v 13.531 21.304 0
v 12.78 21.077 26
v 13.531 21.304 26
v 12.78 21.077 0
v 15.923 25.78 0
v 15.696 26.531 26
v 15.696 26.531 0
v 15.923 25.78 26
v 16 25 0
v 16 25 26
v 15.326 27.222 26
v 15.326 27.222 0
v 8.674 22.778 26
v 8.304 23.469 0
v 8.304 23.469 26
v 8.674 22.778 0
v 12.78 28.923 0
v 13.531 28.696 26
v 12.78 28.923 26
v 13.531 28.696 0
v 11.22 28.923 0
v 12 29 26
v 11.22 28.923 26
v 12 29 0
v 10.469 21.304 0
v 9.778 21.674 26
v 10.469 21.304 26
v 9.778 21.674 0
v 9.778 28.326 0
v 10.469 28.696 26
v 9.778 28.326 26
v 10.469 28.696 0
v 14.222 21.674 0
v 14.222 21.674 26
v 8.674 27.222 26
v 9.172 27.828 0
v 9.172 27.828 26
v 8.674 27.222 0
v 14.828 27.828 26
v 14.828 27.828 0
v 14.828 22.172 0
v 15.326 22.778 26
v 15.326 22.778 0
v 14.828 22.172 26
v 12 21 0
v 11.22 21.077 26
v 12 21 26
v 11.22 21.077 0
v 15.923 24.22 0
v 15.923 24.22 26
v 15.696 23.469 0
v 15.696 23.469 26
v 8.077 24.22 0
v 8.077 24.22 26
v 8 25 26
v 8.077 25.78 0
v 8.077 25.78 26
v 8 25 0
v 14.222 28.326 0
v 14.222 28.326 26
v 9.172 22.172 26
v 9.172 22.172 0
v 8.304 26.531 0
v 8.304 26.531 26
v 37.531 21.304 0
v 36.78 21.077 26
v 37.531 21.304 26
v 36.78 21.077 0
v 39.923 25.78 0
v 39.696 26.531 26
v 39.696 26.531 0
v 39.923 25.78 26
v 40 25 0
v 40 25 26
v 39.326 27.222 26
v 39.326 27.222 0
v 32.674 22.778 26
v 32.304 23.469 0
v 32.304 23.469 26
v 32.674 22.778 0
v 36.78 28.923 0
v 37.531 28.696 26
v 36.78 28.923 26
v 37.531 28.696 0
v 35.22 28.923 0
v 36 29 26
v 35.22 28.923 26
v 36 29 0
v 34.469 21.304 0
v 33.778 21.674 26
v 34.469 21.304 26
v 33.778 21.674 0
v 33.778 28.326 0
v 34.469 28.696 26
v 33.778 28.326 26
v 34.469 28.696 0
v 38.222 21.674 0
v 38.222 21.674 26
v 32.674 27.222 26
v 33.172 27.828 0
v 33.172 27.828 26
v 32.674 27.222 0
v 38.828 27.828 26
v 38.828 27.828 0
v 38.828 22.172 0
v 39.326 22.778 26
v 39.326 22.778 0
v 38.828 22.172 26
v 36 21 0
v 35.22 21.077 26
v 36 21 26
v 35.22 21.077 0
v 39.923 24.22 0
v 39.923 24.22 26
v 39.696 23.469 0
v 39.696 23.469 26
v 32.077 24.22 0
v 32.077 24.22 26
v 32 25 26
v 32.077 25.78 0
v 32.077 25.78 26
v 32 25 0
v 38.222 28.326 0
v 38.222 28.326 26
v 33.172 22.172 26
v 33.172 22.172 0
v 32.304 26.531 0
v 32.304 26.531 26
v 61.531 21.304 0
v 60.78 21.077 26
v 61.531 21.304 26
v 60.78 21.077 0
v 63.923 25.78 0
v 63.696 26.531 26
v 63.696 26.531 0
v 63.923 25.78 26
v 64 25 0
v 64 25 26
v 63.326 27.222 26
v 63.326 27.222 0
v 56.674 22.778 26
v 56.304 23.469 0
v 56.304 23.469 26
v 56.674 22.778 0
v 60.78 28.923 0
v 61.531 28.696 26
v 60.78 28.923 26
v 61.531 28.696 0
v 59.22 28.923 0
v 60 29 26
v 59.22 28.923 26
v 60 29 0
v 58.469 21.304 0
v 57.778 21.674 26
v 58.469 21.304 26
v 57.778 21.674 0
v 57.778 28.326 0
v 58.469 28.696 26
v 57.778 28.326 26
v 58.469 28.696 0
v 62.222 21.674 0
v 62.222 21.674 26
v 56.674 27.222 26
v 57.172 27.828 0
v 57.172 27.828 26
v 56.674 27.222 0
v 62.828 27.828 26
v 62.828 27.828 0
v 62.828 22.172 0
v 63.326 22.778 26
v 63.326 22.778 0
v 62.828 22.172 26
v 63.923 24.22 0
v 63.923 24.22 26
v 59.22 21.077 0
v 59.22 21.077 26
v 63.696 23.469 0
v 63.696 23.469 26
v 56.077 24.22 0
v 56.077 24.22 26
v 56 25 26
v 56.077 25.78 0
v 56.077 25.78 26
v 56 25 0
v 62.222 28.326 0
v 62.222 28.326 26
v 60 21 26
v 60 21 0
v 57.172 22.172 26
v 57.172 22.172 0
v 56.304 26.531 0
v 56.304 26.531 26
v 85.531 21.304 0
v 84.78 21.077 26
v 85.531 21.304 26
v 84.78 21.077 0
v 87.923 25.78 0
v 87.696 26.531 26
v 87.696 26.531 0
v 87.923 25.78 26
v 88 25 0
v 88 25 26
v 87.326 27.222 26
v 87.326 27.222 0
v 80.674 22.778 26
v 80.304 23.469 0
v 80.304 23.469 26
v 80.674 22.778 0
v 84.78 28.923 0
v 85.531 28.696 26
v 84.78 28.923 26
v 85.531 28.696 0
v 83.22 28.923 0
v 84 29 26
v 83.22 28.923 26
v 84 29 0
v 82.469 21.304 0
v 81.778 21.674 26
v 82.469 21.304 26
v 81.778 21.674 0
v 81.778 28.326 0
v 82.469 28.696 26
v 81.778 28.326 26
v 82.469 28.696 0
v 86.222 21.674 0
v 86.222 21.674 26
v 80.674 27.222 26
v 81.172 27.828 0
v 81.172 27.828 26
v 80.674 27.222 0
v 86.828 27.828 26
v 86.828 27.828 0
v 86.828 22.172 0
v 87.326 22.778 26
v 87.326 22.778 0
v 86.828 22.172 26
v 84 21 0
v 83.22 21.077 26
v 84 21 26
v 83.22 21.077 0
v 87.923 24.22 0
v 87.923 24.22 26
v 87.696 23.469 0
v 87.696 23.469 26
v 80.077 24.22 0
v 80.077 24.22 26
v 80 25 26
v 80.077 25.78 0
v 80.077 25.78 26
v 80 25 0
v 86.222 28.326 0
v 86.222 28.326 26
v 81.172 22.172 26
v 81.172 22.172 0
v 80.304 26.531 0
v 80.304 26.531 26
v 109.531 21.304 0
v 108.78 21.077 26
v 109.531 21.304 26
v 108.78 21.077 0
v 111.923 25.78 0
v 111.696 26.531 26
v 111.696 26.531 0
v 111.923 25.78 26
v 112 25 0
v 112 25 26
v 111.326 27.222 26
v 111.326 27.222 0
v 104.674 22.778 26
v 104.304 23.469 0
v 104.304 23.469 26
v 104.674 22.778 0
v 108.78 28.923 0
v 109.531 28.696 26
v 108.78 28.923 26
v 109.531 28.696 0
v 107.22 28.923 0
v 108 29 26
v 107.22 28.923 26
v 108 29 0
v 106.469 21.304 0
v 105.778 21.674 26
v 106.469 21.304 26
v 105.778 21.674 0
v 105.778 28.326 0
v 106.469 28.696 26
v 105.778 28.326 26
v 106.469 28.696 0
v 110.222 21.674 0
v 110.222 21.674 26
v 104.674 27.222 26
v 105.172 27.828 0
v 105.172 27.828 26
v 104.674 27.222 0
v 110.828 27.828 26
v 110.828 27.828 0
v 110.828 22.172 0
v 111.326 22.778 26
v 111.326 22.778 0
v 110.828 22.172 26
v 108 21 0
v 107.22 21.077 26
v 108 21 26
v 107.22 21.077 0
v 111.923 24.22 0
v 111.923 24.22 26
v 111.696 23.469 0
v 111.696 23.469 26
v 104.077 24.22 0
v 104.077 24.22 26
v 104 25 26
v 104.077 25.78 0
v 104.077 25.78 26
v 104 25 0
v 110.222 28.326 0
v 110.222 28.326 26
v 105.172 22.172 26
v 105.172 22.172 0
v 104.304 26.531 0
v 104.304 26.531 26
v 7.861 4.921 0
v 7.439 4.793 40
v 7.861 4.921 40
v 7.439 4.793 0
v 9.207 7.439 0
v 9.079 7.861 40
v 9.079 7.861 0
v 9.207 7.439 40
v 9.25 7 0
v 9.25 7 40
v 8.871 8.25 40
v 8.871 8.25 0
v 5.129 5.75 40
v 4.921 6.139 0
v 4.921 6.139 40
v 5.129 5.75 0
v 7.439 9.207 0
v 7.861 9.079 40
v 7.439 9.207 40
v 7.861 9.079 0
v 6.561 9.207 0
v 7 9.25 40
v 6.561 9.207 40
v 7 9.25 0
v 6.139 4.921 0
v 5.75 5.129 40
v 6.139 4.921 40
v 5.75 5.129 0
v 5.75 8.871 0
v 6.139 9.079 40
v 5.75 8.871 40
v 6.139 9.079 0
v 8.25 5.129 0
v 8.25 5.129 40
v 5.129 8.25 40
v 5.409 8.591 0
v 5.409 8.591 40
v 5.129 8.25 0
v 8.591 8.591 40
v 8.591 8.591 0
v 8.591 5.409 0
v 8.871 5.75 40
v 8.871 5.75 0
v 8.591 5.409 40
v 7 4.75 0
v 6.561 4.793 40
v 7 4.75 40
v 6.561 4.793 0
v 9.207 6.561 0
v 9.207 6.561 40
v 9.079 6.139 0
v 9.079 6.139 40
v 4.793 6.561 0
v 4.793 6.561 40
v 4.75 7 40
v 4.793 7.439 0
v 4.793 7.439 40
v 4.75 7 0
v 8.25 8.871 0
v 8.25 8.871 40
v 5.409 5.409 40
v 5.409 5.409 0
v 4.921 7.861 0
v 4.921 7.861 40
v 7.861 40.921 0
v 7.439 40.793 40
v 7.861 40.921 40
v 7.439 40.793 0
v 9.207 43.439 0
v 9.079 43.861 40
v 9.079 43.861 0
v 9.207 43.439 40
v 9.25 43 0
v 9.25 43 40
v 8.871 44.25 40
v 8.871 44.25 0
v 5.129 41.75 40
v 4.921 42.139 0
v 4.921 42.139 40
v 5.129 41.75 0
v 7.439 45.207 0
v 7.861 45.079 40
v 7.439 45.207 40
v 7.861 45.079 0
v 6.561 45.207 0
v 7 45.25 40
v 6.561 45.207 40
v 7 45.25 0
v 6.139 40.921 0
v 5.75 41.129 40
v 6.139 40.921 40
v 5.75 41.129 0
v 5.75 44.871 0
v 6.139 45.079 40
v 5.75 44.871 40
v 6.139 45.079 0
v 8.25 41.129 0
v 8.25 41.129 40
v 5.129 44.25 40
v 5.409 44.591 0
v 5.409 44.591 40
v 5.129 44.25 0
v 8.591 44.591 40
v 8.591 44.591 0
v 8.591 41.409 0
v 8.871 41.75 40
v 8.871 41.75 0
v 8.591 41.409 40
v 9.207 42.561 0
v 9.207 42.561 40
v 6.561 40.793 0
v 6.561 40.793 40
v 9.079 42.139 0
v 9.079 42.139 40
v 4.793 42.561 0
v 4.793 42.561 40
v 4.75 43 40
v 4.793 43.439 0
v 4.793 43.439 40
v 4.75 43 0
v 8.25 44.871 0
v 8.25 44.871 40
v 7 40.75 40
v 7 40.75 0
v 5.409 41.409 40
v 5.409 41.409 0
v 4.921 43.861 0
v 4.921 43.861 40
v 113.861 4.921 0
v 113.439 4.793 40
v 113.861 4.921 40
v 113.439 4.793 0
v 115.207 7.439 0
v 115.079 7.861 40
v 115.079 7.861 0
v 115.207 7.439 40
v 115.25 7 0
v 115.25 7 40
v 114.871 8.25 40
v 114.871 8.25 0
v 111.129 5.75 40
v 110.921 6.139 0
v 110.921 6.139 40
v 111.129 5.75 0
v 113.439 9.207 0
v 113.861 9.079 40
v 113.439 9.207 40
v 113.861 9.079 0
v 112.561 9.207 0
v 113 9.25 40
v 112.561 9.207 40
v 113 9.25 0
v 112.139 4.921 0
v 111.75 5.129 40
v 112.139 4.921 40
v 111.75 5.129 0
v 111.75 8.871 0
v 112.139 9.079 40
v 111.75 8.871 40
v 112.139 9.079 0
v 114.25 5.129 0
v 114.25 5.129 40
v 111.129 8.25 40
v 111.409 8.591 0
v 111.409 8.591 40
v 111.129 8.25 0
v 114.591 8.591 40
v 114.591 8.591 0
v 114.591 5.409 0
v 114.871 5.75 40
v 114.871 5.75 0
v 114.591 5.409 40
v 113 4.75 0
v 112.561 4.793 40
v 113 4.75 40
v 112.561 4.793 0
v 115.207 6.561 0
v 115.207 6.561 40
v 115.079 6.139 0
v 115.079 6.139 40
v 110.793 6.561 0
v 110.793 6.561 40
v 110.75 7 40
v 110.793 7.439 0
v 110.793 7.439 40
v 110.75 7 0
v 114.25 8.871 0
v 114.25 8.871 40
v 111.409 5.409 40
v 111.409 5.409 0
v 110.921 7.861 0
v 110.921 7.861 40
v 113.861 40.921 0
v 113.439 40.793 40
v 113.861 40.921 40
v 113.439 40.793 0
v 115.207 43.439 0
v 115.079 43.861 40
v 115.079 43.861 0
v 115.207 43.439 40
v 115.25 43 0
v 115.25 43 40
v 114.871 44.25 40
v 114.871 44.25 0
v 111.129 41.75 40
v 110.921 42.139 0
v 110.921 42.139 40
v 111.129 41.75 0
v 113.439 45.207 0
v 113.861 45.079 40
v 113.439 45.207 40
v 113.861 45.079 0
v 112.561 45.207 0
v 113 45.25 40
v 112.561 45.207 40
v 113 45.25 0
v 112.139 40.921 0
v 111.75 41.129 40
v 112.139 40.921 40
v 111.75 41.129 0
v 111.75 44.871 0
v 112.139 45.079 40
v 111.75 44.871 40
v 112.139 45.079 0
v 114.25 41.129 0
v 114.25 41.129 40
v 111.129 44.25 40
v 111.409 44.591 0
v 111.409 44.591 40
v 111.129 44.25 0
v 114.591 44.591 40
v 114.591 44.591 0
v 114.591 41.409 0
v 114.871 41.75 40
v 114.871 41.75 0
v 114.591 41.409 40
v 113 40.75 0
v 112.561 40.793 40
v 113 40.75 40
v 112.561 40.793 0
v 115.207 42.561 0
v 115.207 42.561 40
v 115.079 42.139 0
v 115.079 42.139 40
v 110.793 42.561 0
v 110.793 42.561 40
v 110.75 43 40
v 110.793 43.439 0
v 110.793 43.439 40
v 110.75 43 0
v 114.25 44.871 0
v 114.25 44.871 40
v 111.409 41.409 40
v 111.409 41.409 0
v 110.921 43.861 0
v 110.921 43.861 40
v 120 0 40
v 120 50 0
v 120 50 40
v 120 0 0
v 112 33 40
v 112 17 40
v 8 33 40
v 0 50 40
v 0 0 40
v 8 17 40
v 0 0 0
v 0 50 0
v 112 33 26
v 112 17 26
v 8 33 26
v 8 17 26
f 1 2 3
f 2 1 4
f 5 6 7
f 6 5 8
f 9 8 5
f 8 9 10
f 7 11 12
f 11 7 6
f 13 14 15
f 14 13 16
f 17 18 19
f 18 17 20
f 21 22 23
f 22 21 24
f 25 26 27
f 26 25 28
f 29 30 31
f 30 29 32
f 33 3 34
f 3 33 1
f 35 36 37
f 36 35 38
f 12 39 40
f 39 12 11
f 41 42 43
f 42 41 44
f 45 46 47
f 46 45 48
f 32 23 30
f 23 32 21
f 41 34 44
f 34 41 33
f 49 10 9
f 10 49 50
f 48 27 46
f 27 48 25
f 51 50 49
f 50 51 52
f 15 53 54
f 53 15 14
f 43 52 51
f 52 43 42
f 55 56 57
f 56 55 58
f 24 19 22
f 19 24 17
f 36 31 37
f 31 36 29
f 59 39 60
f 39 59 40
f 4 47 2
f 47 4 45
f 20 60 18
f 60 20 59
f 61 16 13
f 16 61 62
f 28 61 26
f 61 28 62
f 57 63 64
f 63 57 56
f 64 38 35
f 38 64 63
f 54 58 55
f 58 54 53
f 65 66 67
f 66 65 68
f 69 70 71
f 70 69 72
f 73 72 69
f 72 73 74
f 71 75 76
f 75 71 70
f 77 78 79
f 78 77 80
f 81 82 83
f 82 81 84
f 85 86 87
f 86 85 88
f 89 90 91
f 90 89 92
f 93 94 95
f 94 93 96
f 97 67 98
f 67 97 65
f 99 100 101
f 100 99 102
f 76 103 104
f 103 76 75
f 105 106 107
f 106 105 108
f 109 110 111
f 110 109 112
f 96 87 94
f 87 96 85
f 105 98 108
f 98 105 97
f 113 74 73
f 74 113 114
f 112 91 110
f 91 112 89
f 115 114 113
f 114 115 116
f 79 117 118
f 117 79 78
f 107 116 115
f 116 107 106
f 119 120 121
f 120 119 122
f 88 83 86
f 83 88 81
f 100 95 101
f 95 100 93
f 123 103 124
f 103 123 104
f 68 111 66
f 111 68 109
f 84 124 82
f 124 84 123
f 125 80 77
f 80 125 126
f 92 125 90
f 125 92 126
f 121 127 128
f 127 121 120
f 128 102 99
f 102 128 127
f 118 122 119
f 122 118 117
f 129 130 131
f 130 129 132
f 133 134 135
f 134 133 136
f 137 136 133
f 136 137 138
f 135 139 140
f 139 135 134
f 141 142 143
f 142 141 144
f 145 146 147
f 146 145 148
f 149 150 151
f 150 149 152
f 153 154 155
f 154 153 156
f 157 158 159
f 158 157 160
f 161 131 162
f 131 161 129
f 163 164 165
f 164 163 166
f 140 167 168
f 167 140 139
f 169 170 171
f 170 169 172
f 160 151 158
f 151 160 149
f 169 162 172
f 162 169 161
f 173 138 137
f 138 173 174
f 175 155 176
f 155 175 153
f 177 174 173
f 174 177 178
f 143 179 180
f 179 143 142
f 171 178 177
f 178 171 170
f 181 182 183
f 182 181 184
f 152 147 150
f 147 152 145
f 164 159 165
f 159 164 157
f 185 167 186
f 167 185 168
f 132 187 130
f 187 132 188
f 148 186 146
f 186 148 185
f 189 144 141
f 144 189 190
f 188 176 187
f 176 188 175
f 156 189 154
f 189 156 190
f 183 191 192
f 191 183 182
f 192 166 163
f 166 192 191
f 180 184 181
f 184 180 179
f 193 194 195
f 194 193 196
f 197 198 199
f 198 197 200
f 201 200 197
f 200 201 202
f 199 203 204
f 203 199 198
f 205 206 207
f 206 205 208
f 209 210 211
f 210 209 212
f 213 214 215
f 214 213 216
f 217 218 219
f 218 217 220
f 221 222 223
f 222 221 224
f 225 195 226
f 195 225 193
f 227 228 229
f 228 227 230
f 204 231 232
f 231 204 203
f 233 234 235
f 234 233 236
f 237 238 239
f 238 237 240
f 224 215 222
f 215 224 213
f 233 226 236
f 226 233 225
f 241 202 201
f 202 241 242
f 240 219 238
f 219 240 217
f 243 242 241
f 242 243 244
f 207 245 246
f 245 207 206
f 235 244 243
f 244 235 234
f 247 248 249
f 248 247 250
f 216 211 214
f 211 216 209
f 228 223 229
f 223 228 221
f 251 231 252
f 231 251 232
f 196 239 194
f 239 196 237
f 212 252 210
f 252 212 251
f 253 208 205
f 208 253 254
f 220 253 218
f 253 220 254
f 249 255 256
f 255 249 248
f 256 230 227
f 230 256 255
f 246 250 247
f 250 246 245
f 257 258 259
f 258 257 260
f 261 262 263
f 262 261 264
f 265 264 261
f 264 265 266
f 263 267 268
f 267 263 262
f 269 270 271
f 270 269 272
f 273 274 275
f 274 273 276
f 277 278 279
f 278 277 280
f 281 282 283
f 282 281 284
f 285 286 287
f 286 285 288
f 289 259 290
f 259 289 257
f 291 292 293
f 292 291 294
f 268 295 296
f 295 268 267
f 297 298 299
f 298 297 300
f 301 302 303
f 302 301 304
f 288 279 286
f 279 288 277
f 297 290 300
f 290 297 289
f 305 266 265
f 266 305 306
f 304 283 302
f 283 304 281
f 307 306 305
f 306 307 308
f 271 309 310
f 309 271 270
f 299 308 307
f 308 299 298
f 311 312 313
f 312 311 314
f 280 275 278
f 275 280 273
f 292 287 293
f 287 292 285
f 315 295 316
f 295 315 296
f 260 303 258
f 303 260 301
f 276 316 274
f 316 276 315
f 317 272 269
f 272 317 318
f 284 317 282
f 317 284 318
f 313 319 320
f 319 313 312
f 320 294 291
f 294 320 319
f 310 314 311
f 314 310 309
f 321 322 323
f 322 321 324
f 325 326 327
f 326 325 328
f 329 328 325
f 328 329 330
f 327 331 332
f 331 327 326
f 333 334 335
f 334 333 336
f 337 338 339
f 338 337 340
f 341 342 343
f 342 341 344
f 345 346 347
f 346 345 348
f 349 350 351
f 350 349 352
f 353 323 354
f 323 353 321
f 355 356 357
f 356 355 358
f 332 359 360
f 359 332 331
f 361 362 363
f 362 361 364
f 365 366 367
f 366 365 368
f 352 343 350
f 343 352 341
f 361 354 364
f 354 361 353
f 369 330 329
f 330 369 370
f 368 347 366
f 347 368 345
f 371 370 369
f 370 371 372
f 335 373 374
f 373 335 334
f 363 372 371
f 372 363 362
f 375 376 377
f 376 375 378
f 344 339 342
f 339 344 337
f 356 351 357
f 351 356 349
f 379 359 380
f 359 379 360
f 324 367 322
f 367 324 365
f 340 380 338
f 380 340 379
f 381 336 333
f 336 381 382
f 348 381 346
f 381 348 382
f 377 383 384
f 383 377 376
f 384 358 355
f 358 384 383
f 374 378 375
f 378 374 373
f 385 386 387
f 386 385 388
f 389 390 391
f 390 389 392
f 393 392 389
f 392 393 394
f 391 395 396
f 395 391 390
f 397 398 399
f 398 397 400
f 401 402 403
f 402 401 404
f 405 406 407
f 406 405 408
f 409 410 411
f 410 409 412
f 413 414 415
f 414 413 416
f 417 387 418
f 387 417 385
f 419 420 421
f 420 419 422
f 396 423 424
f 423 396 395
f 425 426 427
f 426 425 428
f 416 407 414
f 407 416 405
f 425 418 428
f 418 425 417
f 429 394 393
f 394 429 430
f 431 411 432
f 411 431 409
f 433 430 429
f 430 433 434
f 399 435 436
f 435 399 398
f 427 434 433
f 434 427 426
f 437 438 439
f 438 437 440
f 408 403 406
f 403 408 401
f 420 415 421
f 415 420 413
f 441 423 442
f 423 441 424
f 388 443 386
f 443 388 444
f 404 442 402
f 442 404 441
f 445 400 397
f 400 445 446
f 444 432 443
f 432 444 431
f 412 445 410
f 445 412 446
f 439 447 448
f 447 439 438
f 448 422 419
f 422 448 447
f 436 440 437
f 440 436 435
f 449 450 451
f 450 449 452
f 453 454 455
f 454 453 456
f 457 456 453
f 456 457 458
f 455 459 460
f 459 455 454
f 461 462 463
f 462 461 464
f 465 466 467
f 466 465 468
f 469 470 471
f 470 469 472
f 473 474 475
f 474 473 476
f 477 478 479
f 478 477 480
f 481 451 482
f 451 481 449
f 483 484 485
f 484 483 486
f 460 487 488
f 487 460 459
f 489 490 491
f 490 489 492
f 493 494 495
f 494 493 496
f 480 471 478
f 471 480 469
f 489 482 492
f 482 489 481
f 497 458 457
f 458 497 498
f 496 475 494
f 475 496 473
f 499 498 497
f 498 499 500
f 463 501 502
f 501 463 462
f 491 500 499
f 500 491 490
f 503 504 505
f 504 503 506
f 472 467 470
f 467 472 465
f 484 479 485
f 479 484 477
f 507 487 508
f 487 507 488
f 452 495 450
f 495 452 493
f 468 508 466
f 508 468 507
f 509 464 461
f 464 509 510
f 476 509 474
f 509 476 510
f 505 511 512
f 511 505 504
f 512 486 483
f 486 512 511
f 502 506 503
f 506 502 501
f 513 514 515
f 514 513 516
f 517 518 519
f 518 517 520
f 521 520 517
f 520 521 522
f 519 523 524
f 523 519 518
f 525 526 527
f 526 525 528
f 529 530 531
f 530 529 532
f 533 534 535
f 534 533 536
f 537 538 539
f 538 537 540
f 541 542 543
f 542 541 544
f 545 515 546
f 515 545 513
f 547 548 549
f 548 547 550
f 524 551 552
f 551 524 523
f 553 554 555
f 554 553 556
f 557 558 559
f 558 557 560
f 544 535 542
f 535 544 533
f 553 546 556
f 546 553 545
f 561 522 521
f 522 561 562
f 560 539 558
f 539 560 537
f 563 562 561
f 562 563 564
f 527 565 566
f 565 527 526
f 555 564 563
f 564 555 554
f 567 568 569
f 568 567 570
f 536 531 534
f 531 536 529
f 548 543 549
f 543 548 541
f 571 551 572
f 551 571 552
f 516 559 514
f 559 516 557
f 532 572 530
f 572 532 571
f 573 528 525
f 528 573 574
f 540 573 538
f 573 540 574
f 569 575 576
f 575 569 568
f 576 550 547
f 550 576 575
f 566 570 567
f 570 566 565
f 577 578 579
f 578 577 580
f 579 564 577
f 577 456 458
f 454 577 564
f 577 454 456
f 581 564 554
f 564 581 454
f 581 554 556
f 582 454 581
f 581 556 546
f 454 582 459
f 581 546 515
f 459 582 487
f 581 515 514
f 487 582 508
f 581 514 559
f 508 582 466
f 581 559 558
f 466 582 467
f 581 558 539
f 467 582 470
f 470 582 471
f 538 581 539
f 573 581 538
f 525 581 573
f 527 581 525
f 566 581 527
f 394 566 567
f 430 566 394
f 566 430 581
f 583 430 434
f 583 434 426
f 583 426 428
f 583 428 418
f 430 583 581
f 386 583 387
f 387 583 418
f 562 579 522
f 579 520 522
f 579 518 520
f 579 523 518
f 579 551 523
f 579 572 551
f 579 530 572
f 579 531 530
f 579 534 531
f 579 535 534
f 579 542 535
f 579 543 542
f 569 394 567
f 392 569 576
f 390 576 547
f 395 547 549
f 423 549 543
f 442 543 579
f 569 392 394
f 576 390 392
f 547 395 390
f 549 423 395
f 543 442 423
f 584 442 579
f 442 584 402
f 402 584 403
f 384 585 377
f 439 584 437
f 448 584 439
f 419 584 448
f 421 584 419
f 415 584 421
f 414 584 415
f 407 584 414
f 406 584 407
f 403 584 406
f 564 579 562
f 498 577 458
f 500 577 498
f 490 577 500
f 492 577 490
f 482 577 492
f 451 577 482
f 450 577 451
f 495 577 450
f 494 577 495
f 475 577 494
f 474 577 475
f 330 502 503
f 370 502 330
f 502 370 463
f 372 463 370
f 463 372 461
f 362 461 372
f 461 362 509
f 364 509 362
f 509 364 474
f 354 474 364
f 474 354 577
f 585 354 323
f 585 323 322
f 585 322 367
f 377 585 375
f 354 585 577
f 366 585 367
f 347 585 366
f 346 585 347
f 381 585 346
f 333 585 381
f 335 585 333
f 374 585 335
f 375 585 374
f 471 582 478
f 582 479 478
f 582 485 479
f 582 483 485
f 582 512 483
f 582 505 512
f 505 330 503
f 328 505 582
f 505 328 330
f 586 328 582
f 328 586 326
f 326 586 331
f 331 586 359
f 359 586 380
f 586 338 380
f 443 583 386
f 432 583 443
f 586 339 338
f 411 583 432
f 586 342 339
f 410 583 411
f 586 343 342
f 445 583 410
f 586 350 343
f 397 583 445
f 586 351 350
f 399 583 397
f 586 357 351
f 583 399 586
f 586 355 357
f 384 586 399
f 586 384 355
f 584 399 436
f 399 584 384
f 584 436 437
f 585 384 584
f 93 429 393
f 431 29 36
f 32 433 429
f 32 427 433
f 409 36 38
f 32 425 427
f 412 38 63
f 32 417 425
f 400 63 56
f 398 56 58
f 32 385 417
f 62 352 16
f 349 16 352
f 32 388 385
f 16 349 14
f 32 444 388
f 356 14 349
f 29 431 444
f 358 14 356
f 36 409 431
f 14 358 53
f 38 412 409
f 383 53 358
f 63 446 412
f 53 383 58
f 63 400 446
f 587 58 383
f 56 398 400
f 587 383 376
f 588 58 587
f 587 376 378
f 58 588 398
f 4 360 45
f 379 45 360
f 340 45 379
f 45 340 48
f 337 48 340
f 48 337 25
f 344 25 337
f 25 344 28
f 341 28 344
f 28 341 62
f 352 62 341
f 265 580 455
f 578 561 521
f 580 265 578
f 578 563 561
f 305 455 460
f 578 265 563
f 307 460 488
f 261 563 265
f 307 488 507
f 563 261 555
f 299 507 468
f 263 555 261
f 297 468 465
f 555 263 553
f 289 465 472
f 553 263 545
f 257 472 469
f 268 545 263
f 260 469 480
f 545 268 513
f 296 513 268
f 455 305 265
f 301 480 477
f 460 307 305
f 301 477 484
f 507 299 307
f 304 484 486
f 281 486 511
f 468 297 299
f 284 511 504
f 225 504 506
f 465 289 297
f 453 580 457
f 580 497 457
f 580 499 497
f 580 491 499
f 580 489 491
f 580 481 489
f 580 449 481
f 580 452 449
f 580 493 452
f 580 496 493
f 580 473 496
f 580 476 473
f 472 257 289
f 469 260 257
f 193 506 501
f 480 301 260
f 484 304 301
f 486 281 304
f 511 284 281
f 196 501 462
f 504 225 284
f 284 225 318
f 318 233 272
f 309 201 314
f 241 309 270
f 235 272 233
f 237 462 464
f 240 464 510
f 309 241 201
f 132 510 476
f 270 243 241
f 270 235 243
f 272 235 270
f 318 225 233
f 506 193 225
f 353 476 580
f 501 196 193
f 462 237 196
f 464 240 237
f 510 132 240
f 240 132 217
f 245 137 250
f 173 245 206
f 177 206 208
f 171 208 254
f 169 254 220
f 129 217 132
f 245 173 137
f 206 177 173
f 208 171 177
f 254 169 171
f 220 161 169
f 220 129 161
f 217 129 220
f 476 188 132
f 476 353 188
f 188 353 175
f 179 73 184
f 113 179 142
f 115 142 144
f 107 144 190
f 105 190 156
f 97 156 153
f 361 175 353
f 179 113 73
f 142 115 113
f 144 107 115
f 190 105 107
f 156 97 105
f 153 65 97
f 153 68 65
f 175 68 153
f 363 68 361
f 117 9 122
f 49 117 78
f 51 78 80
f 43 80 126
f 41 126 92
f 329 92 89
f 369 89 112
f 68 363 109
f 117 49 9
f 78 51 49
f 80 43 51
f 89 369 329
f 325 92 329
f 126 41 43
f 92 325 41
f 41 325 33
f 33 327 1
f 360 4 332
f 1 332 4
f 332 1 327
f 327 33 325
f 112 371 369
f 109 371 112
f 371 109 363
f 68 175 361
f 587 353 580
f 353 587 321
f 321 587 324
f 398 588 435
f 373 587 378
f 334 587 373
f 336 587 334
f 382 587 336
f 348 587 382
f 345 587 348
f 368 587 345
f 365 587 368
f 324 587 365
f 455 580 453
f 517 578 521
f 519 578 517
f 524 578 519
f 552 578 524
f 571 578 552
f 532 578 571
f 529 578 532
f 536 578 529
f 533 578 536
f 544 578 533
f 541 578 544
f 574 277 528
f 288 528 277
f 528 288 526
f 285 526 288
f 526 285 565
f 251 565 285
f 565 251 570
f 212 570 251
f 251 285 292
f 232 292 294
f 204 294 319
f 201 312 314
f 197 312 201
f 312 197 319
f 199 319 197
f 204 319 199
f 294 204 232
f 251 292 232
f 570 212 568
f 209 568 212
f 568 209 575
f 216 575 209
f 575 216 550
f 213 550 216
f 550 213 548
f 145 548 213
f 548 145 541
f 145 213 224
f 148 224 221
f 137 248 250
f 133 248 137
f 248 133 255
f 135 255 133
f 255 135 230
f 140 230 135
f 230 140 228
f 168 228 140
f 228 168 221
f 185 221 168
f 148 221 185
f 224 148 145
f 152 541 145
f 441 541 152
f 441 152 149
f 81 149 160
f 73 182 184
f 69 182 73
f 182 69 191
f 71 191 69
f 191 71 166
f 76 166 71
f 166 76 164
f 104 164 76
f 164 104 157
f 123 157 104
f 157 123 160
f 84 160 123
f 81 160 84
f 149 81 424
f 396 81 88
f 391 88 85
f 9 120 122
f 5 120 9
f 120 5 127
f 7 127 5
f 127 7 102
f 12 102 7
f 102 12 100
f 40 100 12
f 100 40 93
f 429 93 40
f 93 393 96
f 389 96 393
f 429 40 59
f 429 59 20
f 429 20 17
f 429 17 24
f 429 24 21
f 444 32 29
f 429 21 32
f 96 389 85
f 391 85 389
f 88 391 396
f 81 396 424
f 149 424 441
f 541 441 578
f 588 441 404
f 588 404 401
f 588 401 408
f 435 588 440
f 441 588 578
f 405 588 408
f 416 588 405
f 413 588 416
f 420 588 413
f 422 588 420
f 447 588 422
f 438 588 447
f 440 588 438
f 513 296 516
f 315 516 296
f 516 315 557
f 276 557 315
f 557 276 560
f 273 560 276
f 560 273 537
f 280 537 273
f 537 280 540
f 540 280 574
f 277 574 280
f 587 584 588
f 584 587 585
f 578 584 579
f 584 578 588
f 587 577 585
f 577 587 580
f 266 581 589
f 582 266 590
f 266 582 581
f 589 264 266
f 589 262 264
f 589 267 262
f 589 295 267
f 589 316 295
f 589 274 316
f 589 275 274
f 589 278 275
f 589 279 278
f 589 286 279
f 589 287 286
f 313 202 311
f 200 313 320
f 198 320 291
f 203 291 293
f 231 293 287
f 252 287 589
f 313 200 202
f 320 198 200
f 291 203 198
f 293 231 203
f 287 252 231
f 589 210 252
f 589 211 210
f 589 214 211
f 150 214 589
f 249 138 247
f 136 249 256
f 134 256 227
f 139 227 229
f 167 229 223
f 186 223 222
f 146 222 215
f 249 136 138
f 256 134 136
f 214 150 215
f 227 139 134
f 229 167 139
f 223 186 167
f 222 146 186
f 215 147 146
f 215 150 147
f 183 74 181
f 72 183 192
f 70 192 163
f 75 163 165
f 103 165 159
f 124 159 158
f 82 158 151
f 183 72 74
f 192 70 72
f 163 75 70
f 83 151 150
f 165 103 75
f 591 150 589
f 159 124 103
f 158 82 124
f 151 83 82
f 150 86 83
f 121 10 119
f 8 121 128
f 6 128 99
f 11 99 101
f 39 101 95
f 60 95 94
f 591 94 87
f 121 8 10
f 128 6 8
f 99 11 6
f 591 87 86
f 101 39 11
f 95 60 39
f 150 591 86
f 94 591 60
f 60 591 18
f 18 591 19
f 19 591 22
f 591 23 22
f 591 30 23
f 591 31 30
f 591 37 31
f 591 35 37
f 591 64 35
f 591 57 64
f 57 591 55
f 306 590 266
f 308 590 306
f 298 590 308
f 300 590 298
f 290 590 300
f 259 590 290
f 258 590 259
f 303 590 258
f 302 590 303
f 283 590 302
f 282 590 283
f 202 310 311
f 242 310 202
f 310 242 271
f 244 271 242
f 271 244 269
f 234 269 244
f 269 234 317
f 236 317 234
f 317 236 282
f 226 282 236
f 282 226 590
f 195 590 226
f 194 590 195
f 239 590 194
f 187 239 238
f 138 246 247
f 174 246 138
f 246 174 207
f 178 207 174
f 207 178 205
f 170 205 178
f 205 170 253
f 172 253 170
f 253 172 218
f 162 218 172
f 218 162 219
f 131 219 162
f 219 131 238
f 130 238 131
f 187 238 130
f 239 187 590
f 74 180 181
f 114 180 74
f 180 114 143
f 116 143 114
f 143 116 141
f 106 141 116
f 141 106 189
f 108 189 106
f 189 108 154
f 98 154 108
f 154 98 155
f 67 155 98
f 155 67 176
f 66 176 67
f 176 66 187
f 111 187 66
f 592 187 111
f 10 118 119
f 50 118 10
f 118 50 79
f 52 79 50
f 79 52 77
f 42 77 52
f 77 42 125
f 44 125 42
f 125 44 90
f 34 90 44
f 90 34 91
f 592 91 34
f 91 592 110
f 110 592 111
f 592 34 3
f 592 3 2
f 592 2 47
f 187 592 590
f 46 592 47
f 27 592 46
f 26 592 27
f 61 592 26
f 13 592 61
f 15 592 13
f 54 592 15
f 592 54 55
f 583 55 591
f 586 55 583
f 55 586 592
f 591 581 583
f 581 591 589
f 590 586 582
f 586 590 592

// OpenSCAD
$fn = 32;

// ----------------------------------------------------------------------
// Manifold block: gallery_top manifold
// ----------------------------------------------------------------------

// --- parameters (mm) ---
block_l = 120;            // block length, X
block_w = 50;             // block width, Y
block_h = 40;             // block height, Z
port_d = 8;               // port bore diameter
port_pitch = 24;          // port pitch along X
gallery_d = 16;           // top gallery width, Y
gallery_depth = 14;       // gallery pocket depth
wall_p = 8;               // gallery end wall thickness, X
mnt_d = 4.5;              // mounting hole diameter
mnt_in = 7;               // mounting hole inset from the edges

n_ports = 5;  // ports in the row
port_x0 = (block_l - (n_ports - 1) * port_pitch) / 2;  // first port X

difference() {
  cube([block_l, block_w, block_h]);
  for (i = [0 : n_ports - 1])
    translate([port_x0 + i * port_pitch, block_w / 2, -1])
      cylinder(h = block_h + 2, d = port_d);
  translate([wall_p, block_w / 2 - gallery_d / 2, block_h - gallery_depth])
    cube([block_l - 2 * wall_p, gallery_d, gallery_depth + 1]);
  for (cx = [mnt_in, block_l - mnt_in])
    for (cy = [mnt_in, block_w - mnt_in])
      translate([cx, cy, -1]) cylinder(h = block_h + 2, d = mnt_d);
}
